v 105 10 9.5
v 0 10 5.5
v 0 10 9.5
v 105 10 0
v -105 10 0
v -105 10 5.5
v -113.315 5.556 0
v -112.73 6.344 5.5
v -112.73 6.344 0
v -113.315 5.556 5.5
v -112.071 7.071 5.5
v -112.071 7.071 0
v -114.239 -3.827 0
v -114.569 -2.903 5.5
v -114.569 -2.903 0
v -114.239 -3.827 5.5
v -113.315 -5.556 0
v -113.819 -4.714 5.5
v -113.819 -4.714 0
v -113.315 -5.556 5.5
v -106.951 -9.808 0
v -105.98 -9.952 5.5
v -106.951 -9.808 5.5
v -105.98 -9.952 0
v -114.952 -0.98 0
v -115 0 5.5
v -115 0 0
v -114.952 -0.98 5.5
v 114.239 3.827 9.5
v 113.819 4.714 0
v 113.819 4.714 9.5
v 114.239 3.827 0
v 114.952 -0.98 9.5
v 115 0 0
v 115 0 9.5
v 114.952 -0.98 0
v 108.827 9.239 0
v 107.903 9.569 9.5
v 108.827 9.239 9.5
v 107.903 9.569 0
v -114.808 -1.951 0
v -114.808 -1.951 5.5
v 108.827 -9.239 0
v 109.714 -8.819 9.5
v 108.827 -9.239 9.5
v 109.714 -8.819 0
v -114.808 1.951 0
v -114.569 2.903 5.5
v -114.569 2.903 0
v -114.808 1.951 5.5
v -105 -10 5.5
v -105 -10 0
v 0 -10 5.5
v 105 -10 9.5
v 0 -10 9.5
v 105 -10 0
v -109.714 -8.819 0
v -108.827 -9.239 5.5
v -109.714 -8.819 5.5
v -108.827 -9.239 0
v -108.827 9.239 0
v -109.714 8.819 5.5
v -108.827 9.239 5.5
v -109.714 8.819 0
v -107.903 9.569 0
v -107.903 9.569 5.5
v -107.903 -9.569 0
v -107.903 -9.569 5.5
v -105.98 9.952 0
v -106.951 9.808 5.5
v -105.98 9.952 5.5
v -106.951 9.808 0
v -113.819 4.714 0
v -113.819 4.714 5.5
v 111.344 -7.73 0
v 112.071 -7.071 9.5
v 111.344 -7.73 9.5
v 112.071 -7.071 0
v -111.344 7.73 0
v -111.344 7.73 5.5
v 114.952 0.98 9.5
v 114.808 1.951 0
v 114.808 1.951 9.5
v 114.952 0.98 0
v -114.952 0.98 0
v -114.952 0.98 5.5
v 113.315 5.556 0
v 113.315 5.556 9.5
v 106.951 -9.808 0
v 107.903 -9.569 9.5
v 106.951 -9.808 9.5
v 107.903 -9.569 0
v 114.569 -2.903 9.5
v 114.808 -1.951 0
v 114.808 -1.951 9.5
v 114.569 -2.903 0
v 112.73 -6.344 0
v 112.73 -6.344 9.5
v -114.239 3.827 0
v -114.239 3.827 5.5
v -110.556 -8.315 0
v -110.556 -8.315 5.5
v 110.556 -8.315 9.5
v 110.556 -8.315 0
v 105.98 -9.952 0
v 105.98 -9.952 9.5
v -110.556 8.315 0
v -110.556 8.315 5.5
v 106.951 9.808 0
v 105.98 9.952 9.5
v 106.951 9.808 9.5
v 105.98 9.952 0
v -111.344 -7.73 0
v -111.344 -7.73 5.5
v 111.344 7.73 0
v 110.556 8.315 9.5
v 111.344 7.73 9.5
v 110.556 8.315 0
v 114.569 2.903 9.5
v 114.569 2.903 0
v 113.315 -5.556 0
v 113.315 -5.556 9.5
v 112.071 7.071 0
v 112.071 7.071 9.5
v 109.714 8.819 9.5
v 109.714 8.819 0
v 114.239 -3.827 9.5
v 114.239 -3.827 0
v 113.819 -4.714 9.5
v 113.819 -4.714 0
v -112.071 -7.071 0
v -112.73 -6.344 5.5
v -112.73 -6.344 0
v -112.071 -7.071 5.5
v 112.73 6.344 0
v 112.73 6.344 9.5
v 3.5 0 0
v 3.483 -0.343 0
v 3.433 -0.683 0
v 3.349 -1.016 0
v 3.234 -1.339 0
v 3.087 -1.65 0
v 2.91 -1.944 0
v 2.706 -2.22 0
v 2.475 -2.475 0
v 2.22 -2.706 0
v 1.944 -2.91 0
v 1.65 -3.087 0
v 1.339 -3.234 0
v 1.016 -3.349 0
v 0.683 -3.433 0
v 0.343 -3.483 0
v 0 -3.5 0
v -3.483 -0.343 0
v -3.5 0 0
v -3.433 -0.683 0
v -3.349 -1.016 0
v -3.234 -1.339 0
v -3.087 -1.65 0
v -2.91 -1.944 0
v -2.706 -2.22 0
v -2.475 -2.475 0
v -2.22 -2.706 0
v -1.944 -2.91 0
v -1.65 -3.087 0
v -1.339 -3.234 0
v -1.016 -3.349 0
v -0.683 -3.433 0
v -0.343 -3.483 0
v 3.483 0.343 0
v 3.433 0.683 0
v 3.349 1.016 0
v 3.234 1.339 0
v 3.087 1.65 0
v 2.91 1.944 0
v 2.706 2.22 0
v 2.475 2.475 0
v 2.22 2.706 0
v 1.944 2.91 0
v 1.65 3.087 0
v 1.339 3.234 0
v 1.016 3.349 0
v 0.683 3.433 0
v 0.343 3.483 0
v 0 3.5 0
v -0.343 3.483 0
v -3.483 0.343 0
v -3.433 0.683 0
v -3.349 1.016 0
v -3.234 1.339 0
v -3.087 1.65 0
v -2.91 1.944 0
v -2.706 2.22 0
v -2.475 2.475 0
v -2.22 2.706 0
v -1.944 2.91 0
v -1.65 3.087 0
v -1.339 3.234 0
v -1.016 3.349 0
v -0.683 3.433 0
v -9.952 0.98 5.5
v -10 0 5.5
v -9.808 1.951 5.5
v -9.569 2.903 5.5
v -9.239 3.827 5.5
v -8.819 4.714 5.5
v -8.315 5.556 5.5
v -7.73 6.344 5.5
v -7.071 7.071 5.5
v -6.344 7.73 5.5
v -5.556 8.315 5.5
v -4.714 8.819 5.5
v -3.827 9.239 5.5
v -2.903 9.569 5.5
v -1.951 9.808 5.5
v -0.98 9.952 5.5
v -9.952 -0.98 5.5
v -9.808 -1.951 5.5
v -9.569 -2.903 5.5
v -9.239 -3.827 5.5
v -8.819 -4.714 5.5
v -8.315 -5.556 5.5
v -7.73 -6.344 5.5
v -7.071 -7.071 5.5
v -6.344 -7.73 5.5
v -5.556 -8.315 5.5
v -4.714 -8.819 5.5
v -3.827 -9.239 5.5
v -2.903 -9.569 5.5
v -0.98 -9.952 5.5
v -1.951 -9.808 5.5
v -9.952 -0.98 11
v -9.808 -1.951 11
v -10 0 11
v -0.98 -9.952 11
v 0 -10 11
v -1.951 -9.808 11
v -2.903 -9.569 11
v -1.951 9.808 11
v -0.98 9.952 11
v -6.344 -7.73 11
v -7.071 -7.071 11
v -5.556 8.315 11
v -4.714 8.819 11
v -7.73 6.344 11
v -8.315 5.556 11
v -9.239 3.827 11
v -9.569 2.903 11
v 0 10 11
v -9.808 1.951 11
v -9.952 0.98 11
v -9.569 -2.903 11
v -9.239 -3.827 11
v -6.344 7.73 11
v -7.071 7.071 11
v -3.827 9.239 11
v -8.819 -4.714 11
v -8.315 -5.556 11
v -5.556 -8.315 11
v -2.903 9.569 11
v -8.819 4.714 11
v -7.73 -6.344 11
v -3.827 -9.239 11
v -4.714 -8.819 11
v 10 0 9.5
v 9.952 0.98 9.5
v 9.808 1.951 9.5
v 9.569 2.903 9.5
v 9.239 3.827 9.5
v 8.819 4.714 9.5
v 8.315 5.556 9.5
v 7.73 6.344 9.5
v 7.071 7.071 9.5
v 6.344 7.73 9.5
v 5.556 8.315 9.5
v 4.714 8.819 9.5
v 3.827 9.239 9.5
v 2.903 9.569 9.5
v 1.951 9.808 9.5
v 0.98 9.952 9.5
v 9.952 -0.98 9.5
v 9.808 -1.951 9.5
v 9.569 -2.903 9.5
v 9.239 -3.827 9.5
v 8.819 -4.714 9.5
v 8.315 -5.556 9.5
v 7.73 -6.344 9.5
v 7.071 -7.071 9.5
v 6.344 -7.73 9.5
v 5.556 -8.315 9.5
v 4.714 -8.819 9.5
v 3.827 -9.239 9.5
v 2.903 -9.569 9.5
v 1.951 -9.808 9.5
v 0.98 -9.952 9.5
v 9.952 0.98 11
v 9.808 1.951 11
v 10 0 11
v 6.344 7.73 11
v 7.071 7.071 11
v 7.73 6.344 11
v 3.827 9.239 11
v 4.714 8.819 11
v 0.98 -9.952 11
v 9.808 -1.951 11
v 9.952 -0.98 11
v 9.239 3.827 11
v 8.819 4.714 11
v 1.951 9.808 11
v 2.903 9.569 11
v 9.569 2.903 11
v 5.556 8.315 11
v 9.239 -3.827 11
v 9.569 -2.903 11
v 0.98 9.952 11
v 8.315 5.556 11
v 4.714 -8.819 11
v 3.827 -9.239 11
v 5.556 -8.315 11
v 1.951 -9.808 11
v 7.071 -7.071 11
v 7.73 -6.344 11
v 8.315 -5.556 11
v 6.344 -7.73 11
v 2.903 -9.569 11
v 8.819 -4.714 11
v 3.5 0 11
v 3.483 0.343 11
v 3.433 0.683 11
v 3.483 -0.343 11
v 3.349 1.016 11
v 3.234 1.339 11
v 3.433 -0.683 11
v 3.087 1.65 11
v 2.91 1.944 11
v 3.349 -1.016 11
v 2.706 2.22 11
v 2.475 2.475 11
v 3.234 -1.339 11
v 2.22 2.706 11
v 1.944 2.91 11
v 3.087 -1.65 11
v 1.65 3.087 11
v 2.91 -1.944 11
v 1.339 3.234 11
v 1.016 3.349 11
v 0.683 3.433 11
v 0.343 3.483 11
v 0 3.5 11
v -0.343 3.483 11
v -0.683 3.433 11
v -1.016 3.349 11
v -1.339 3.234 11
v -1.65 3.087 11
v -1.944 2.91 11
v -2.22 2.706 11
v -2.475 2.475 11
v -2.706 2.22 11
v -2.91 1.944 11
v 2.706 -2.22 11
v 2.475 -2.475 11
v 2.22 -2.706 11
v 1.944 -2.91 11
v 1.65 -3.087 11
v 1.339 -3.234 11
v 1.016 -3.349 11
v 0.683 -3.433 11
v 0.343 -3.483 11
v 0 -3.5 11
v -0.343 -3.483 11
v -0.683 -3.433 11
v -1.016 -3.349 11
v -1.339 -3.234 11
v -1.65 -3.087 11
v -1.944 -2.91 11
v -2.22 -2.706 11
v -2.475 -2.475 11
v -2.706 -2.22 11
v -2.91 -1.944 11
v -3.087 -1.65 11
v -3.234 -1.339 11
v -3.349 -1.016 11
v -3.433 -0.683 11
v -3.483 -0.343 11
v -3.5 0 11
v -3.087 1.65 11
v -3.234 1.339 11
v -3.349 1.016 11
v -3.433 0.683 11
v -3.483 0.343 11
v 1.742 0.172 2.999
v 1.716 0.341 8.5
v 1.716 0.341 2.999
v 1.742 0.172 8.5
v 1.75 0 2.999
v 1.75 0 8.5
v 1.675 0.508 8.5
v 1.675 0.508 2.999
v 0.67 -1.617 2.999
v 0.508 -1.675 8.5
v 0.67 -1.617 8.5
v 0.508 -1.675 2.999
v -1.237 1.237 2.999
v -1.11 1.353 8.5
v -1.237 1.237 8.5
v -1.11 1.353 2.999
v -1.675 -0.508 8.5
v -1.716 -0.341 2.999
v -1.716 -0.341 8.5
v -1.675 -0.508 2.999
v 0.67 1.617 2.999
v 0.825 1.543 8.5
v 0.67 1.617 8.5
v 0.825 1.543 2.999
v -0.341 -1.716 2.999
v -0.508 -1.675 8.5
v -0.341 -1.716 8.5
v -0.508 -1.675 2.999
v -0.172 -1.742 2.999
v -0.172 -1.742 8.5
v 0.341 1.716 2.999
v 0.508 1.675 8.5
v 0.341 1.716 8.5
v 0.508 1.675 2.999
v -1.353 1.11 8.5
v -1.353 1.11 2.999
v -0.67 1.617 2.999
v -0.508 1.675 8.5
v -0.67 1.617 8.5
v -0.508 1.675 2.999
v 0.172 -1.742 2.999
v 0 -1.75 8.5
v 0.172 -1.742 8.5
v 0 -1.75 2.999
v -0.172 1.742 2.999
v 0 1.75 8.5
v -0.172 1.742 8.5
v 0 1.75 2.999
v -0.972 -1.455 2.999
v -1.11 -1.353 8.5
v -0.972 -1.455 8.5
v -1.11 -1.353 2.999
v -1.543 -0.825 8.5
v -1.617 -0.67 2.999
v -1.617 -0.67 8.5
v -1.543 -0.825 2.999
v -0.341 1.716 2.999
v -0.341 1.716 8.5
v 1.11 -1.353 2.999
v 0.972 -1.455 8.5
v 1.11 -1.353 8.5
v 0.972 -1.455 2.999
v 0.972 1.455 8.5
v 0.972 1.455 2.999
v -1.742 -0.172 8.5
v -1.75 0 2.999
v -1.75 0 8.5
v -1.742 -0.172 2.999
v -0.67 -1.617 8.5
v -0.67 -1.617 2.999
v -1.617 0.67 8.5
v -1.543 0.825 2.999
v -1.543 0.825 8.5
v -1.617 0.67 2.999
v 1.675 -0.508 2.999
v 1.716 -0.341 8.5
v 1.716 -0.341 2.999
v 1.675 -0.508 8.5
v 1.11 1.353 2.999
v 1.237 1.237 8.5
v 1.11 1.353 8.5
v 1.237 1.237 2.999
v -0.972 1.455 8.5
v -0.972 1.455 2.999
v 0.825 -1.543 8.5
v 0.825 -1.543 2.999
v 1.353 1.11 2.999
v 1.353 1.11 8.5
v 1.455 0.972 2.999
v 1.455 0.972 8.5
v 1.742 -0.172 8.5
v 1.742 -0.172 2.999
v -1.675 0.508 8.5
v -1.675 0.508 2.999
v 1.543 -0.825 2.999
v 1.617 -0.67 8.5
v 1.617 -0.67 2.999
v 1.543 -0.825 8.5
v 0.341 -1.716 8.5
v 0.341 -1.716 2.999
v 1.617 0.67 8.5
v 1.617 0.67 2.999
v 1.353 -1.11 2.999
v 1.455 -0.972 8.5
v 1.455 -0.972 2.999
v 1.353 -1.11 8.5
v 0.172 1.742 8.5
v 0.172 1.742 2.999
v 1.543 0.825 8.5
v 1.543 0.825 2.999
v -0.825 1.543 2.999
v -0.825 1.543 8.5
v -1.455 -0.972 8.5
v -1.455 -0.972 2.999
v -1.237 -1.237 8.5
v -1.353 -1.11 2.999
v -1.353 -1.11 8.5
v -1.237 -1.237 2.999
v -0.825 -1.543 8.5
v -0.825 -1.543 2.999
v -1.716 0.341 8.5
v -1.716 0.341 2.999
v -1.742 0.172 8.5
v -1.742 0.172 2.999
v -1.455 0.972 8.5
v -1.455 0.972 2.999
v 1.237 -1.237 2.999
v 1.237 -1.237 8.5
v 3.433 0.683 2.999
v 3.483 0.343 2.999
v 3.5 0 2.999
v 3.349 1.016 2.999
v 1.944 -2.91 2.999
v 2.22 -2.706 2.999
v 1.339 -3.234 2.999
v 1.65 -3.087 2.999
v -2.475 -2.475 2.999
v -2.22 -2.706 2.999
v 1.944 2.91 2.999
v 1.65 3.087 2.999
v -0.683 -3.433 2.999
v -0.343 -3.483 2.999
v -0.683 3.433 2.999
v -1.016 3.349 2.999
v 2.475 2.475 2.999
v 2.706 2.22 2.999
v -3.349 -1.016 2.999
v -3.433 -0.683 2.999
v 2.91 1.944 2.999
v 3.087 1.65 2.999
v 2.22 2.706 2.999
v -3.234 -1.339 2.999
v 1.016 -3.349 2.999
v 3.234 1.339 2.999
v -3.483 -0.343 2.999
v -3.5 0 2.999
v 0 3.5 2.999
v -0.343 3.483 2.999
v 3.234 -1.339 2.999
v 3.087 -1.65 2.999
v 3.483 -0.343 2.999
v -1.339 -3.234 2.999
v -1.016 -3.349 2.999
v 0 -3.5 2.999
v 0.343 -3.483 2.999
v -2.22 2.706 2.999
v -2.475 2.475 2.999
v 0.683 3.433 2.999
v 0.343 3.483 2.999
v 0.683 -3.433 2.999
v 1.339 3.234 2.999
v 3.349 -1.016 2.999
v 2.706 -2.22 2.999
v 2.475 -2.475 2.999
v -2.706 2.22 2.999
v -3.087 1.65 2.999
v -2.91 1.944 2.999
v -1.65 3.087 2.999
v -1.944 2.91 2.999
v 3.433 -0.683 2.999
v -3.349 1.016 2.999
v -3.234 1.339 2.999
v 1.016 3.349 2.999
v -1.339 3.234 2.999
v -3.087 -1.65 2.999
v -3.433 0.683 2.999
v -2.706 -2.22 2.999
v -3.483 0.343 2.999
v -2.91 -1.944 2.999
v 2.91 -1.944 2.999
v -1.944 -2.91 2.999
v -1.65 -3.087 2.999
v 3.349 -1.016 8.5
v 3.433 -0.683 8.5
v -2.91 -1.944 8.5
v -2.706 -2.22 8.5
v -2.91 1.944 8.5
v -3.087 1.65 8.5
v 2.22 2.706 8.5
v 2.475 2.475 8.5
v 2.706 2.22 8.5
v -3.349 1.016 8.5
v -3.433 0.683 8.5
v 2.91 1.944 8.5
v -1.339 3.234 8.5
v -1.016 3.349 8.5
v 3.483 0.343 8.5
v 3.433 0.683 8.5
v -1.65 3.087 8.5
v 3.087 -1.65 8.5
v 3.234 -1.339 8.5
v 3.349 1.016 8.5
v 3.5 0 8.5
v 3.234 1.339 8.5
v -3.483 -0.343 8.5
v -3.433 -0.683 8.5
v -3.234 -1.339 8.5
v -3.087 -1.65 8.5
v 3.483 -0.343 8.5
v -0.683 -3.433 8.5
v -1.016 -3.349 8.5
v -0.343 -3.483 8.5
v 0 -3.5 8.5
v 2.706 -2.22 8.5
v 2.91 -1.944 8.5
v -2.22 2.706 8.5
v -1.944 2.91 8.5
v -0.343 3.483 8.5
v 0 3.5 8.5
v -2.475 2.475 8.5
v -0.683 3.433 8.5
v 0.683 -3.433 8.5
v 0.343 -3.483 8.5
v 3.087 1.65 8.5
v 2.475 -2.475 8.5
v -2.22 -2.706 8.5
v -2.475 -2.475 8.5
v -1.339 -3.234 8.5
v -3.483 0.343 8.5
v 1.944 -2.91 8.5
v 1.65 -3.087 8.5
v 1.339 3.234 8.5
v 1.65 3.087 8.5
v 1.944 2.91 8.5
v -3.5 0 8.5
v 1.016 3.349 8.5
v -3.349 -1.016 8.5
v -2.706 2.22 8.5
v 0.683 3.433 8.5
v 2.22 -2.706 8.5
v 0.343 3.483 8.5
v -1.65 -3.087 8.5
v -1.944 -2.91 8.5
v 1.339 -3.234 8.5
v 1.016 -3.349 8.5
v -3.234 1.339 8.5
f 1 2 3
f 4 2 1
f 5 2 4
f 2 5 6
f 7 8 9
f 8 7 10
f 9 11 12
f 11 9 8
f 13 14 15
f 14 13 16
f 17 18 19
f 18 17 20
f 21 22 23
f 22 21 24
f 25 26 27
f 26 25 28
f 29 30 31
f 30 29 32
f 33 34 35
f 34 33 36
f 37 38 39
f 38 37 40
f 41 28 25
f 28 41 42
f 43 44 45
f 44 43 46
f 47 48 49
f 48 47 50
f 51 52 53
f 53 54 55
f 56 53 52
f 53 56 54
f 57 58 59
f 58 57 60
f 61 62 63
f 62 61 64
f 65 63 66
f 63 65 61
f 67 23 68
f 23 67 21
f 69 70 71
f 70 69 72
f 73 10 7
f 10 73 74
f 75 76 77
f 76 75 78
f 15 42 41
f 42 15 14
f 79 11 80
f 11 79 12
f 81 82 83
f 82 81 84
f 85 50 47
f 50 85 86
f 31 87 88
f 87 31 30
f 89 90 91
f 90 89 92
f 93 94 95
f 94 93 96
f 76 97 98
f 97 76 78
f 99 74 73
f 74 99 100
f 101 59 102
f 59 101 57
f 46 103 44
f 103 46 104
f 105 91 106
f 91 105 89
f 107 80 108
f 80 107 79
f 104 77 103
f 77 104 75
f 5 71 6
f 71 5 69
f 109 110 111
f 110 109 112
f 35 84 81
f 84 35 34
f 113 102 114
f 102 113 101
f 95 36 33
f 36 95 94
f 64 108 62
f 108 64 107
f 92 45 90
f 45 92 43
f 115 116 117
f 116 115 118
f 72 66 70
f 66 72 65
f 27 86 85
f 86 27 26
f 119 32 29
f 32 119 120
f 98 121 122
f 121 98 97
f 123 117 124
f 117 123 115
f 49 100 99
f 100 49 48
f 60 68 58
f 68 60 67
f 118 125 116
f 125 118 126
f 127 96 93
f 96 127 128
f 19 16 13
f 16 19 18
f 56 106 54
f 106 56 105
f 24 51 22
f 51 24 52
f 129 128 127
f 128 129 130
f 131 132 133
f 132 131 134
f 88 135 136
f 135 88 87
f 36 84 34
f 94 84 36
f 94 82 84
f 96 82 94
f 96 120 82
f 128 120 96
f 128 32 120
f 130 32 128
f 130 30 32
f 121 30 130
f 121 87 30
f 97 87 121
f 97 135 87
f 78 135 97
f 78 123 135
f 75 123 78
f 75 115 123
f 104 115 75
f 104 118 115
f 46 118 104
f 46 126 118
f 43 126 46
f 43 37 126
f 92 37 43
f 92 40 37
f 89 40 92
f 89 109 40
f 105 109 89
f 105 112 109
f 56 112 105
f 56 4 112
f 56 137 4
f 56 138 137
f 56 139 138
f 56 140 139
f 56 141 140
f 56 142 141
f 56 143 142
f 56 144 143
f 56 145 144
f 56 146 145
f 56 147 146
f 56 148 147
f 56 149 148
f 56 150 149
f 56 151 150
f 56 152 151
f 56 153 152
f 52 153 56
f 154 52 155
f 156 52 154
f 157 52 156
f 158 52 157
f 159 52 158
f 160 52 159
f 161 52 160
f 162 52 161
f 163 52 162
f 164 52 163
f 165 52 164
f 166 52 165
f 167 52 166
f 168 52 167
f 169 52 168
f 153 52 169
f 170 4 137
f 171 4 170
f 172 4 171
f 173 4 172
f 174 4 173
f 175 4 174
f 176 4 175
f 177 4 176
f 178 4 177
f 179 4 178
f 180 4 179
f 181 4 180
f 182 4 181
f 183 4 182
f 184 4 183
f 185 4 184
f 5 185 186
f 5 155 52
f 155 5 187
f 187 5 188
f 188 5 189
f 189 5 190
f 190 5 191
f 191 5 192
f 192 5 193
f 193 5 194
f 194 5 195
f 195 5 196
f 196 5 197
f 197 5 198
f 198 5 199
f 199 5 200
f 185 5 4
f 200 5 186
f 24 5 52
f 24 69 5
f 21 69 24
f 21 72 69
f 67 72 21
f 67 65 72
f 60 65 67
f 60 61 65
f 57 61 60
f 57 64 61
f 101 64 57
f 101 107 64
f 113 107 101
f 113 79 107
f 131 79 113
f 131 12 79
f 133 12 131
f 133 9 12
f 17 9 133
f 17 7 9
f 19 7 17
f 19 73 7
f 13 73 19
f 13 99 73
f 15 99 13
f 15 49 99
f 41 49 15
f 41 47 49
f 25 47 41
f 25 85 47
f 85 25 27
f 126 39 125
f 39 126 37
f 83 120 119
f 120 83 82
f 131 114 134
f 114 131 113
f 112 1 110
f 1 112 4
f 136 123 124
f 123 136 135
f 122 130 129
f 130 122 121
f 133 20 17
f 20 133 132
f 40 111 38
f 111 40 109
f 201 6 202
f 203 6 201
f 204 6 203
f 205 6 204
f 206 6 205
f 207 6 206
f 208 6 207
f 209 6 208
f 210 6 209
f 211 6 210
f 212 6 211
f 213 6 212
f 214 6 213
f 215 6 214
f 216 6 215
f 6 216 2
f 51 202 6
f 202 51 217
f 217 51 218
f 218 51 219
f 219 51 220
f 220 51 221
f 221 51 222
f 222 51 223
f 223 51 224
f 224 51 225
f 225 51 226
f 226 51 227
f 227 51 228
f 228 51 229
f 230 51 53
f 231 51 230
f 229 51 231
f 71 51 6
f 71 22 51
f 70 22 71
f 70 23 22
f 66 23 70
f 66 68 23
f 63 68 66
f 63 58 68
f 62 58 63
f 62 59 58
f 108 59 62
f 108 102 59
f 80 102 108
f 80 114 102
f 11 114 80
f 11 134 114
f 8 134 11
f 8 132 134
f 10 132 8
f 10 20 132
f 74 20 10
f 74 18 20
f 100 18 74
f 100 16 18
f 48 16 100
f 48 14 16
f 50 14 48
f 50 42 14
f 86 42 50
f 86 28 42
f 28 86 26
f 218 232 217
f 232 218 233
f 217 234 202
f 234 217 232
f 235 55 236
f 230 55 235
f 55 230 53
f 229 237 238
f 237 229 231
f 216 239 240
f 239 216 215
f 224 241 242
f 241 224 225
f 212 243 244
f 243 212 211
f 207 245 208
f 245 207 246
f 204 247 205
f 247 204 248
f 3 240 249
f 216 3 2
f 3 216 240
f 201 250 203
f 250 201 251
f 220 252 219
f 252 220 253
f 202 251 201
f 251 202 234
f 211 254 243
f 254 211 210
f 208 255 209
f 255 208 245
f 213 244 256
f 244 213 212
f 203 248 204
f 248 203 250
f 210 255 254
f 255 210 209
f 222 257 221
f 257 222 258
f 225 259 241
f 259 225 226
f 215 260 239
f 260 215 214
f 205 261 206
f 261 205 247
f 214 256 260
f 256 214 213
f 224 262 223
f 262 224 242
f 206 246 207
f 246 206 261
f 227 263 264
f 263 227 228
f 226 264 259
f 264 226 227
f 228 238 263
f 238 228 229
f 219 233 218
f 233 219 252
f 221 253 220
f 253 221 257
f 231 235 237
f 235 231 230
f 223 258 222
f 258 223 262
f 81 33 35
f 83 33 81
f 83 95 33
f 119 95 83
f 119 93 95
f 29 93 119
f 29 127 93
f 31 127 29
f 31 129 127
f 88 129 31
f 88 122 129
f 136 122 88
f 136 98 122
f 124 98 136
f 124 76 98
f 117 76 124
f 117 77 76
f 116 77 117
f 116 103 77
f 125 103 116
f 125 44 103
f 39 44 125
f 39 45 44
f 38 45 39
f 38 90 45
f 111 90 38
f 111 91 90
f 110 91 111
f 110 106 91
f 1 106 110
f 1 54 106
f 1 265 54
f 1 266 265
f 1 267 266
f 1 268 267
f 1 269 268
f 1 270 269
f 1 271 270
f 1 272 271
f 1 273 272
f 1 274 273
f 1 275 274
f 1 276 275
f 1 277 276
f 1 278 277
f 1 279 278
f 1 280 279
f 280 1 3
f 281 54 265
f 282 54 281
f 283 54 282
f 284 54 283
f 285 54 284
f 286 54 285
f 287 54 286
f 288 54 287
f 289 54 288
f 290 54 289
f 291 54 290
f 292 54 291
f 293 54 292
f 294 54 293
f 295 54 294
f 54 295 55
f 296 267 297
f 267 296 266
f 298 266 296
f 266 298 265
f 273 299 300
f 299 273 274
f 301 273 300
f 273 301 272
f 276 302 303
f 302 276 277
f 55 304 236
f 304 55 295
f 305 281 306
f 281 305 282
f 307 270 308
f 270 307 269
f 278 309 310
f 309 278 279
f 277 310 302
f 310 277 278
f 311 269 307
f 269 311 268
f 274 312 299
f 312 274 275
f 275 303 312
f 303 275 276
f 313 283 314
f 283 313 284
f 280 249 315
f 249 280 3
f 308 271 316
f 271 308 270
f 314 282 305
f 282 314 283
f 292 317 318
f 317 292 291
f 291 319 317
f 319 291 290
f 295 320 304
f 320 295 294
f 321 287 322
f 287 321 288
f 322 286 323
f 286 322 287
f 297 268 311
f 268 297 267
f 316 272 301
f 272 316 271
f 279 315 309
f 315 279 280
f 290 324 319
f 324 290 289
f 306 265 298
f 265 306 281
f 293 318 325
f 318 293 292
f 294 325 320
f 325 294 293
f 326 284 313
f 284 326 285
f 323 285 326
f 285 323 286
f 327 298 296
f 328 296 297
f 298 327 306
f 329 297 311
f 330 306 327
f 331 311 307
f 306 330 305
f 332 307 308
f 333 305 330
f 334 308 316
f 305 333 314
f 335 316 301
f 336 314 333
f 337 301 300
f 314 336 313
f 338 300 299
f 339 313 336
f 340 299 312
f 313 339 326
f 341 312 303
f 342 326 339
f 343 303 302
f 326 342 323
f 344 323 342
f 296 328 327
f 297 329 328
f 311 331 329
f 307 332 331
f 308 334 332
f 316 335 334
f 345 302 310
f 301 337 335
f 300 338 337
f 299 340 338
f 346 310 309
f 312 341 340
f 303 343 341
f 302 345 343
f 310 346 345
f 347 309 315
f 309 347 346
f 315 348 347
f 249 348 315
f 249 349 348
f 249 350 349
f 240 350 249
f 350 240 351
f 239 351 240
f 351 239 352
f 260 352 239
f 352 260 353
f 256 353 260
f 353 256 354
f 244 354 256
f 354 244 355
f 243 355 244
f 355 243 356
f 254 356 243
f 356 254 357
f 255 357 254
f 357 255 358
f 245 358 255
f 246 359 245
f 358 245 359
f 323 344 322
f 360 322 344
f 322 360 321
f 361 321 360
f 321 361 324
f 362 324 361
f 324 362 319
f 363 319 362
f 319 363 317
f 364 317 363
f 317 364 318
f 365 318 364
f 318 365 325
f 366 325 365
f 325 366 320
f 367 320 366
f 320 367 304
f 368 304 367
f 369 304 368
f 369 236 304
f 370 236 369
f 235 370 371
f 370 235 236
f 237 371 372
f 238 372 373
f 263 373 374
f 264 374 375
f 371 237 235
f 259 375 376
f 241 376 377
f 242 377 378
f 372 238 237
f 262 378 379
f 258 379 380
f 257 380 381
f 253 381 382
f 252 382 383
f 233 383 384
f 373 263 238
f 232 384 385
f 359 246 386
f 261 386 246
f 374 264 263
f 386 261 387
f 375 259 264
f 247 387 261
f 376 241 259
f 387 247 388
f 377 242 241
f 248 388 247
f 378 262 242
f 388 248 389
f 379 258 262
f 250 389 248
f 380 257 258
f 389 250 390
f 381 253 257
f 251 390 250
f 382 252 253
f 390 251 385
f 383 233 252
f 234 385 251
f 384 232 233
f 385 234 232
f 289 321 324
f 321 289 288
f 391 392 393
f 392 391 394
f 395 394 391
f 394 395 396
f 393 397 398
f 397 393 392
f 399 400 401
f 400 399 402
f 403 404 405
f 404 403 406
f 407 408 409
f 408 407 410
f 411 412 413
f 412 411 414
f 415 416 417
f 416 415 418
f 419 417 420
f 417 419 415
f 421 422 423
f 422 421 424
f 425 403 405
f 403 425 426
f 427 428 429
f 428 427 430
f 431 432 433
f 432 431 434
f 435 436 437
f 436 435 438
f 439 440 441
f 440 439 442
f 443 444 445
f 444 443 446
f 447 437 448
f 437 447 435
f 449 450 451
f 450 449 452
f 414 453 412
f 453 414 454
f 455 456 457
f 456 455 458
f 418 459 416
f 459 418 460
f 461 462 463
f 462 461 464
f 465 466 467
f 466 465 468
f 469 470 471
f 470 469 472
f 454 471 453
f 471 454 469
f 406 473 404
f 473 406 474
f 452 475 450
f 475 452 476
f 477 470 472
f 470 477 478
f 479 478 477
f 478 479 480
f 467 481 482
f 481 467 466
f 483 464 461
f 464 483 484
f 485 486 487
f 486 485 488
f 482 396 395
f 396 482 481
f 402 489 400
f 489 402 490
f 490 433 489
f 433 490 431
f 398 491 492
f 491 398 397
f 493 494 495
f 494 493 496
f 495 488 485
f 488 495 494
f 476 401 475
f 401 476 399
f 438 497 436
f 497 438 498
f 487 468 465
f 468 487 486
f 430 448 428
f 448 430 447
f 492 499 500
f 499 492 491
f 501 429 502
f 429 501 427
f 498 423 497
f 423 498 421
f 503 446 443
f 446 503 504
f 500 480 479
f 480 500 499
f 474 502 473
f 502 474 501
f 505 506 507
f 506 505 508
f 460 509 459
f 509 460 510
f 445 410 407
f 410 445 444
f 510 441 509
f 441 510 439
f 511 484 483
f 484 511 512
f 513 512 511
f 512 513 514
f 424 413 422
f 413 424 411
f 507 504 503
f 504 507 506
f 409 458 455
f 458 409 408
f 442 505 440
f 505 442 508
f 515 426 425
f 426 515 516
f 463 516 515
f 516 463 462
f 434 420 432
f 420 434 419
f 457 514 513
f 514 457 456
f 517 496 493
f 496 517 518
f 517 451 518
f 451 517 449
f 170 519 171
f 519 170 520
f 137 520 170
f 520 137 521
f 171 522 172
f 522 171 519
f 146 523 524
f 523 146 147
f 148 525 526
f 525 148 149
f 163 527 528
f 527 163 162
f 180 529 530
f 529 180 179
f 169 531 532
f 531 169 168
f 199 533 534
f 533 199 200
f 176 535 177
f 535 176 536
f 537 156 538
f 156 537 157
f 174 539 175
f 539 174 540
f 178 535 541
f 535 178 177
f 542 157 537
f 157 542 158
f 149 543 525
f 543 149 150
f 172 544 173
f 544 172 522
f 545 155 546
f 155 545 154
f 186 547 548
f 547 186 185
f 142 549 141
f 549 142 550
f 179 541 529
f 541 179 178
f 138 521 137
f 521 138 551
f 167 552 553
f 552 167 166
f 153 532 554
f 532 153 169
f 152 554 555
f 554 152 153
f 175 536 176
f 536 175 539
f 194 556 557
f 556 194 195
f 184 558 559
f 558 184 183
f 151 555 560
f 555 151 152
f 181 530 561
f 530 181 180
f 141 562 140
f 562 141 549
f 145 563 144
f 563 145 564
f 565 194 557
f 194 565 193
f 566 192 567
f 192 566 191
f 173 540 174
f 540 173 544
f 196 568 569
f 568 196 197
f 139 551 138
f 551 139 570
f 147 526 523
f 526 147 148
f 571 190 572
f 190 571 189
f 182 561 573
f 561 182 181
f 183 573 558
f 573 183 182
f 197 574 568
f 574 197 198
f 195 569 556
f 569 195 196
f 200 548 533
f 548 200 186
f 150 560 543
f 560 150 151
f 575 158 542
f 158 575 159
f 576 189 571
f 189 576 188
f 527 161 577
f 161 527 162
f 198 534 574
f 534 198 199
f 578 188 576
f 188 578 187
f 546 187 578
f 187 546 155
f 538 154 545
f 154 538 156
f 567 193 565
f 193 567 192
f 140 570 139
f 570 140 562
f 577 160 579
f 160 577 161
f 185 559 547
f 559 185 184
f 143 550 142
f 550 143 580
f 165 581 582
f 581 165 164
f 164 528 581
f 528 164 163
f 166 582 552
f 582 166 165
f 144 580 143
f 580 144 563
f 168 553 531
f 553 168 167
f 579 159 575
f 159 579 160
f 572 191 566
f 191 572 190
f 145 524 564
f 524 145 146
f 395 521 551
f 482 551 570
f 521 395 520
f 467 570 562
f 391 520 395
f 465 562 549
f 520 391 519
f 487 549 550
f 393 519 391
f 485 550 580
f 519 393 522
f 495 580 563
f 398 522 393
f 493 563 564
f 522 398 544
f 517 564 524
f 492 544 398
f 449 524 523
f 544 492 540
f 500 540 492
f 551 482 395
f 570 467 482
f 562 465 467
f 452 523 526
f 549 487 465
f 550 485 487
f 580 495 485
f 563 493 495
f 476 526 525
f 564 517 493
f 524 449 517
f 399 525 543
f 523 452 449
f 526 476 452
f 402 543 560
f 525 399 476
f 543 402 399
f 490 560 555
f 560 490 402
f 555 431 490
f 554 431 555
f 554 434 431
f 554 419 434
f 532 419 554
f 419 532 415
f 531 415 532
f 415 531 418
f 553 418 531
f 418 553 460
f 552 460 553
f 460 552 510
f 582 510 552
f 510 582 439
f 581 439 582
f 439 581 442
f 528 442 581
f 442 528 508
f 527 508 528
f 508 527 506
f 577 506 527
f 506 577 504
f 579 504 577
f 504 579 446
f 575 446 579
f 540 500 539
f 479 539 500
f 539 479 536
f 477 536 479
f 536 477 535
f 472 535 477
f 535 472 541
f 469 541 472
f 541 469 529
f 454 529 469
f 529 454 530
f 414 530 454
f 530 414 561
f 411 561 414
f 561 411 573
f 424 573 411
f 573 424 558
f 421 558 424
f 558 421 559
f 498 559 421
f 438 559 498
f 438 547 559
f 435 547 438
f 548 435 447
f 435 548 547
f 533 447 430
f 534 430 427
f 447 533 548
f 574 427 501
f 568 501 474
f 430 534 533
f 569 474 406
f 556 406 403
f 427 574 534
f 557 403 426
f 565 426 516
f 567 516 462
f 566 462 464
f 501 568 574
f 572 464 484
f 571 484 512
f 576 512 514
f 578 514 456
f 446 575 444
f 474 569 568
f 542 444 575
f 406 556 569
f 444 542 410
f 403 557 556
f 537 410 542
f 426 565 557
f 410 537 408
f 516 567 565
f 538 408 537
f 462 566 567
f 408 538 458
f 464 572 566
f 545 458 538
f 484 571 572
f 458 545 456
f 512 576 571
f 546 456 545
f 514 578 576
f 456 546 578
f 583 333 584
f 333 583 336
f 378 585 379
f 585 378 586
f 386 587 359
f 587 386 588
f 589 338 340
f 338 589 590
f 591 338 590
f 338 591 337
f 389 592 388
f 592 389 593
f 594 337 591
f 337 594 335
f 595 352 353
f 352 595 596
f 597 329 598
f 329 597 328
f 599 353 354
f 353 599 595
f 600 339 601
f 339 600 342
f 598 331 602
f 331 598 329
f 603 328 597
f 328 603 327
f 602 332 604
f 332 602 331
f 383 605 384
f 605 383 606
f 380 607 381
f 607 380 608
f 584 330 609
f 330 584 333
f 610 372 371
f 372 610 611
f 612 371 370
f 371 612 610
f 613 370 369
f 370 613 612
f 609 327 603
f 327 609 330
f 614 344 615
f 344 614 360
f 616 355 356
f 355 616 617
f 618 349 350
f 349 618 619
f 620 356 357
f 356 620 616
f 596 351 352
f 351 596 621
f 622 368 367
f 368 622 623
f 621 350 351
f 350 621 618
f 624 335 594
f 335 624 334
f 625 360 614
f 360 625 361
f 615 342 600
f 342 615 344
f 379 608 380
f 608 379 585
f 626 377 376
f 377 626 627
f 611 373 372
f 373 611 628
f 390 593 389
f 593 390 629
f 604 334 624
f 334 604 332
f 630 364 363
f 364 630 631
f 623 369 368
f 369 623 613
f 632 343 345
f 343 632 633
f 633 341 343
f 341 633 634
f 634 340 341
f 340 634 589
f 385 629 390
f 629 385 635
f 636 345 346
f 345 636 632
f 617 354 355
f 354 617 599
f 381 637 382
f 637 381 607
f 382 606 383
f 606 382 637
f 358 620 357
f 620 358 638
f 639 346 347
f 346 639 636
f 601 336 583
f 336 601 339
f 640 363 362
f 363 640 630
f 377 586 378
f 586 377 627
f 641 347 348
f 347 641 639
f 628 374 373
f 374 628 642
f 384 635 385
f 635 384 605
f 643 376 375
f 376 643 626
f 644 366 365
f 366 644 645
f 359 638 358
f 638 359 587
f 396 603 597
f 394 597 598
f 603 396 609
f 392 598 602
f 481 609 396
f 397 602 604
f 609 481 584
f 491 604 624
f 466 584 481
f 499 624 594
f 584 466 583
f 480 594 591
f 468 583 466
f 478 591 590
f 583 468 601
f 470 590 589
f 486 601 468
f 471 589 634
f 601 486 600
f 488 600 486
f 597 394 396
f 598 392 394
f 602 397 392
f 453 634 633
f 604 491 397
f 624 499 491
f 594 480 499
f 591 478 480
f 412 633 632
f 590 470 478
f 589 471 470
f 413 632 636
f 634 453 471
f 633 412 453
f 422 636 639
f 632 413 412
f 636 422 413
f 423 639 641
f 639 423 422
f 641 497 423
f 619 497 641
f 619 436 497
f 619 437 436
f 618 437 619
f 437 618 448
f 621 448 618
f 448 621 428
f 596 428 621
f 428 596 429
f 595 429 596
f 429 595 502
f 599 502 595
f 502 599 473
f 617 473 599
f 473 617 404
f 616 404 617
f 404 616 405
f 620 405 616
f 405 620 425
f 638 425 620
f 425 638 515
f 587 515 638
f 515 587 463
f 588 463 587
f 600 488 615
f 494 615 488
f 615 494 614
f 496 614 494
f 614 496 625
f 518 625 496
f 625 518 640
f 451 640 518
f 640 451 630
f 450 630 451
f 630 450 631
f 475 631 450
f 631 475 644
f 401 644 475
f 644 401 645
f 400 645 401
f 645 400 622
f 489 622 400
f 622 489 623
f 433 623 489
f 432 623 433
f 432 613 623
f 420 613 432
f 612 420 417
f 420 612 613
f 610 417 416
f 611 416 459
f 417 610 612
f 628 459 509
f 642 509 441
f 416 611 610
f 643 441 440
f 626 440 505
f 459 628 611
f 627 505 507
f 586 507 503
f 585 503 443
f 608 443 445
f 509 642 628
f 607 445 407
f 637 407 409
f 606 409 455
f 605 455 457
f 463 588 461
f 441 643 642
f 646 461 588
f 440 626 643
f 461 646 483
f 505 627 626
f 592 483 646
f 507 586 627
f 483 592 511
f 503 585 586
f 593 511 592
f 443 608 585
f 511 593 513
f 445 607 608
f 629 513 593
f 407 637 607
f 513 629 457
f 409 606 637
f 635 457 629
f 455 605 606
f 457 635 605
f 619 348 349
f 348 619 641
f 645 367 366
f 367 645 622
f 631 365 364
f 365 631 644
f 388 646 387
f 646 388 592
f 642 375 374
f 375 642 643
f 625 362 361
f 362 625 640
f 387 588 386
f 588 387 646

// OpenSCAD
width = 20;
length = 210;
inset = 4;
thickness = 9.5;
screwHole = 3.5;
headDiameter = 7;
headDepth = 3;
extraThickness = 1.5;
extraHoleDiameter = 7;
extraHoleDepth = 2.5;

$fn = 64;


module basic() {
linear_extrude(height=thickness-inset)
hull() {
    translate([-length/2,0]) circle(d=width);
    translate([length/2,0]) circle(d=width);
}

linear_extrude(height=thickness)
hull() {
    circle(d=width);
    translate([length/2,0]) circle(d=width);
}
cylinder(d=width,h=thickness+extraThickness);
}

difference() {
    basic();
    translate([0,0,-1])
    cylinder(d=screwHole,h=thickness+extraThickness+20);
    translate([0,0,-0.001]) cylinder(d=headDiameter,h=headDepth);
    translate([0,0,thickness+extraThickness-extraHoleDepth]) cylinder(d=extraHoleDiameter,h=extraHoleDepth+1);
}
